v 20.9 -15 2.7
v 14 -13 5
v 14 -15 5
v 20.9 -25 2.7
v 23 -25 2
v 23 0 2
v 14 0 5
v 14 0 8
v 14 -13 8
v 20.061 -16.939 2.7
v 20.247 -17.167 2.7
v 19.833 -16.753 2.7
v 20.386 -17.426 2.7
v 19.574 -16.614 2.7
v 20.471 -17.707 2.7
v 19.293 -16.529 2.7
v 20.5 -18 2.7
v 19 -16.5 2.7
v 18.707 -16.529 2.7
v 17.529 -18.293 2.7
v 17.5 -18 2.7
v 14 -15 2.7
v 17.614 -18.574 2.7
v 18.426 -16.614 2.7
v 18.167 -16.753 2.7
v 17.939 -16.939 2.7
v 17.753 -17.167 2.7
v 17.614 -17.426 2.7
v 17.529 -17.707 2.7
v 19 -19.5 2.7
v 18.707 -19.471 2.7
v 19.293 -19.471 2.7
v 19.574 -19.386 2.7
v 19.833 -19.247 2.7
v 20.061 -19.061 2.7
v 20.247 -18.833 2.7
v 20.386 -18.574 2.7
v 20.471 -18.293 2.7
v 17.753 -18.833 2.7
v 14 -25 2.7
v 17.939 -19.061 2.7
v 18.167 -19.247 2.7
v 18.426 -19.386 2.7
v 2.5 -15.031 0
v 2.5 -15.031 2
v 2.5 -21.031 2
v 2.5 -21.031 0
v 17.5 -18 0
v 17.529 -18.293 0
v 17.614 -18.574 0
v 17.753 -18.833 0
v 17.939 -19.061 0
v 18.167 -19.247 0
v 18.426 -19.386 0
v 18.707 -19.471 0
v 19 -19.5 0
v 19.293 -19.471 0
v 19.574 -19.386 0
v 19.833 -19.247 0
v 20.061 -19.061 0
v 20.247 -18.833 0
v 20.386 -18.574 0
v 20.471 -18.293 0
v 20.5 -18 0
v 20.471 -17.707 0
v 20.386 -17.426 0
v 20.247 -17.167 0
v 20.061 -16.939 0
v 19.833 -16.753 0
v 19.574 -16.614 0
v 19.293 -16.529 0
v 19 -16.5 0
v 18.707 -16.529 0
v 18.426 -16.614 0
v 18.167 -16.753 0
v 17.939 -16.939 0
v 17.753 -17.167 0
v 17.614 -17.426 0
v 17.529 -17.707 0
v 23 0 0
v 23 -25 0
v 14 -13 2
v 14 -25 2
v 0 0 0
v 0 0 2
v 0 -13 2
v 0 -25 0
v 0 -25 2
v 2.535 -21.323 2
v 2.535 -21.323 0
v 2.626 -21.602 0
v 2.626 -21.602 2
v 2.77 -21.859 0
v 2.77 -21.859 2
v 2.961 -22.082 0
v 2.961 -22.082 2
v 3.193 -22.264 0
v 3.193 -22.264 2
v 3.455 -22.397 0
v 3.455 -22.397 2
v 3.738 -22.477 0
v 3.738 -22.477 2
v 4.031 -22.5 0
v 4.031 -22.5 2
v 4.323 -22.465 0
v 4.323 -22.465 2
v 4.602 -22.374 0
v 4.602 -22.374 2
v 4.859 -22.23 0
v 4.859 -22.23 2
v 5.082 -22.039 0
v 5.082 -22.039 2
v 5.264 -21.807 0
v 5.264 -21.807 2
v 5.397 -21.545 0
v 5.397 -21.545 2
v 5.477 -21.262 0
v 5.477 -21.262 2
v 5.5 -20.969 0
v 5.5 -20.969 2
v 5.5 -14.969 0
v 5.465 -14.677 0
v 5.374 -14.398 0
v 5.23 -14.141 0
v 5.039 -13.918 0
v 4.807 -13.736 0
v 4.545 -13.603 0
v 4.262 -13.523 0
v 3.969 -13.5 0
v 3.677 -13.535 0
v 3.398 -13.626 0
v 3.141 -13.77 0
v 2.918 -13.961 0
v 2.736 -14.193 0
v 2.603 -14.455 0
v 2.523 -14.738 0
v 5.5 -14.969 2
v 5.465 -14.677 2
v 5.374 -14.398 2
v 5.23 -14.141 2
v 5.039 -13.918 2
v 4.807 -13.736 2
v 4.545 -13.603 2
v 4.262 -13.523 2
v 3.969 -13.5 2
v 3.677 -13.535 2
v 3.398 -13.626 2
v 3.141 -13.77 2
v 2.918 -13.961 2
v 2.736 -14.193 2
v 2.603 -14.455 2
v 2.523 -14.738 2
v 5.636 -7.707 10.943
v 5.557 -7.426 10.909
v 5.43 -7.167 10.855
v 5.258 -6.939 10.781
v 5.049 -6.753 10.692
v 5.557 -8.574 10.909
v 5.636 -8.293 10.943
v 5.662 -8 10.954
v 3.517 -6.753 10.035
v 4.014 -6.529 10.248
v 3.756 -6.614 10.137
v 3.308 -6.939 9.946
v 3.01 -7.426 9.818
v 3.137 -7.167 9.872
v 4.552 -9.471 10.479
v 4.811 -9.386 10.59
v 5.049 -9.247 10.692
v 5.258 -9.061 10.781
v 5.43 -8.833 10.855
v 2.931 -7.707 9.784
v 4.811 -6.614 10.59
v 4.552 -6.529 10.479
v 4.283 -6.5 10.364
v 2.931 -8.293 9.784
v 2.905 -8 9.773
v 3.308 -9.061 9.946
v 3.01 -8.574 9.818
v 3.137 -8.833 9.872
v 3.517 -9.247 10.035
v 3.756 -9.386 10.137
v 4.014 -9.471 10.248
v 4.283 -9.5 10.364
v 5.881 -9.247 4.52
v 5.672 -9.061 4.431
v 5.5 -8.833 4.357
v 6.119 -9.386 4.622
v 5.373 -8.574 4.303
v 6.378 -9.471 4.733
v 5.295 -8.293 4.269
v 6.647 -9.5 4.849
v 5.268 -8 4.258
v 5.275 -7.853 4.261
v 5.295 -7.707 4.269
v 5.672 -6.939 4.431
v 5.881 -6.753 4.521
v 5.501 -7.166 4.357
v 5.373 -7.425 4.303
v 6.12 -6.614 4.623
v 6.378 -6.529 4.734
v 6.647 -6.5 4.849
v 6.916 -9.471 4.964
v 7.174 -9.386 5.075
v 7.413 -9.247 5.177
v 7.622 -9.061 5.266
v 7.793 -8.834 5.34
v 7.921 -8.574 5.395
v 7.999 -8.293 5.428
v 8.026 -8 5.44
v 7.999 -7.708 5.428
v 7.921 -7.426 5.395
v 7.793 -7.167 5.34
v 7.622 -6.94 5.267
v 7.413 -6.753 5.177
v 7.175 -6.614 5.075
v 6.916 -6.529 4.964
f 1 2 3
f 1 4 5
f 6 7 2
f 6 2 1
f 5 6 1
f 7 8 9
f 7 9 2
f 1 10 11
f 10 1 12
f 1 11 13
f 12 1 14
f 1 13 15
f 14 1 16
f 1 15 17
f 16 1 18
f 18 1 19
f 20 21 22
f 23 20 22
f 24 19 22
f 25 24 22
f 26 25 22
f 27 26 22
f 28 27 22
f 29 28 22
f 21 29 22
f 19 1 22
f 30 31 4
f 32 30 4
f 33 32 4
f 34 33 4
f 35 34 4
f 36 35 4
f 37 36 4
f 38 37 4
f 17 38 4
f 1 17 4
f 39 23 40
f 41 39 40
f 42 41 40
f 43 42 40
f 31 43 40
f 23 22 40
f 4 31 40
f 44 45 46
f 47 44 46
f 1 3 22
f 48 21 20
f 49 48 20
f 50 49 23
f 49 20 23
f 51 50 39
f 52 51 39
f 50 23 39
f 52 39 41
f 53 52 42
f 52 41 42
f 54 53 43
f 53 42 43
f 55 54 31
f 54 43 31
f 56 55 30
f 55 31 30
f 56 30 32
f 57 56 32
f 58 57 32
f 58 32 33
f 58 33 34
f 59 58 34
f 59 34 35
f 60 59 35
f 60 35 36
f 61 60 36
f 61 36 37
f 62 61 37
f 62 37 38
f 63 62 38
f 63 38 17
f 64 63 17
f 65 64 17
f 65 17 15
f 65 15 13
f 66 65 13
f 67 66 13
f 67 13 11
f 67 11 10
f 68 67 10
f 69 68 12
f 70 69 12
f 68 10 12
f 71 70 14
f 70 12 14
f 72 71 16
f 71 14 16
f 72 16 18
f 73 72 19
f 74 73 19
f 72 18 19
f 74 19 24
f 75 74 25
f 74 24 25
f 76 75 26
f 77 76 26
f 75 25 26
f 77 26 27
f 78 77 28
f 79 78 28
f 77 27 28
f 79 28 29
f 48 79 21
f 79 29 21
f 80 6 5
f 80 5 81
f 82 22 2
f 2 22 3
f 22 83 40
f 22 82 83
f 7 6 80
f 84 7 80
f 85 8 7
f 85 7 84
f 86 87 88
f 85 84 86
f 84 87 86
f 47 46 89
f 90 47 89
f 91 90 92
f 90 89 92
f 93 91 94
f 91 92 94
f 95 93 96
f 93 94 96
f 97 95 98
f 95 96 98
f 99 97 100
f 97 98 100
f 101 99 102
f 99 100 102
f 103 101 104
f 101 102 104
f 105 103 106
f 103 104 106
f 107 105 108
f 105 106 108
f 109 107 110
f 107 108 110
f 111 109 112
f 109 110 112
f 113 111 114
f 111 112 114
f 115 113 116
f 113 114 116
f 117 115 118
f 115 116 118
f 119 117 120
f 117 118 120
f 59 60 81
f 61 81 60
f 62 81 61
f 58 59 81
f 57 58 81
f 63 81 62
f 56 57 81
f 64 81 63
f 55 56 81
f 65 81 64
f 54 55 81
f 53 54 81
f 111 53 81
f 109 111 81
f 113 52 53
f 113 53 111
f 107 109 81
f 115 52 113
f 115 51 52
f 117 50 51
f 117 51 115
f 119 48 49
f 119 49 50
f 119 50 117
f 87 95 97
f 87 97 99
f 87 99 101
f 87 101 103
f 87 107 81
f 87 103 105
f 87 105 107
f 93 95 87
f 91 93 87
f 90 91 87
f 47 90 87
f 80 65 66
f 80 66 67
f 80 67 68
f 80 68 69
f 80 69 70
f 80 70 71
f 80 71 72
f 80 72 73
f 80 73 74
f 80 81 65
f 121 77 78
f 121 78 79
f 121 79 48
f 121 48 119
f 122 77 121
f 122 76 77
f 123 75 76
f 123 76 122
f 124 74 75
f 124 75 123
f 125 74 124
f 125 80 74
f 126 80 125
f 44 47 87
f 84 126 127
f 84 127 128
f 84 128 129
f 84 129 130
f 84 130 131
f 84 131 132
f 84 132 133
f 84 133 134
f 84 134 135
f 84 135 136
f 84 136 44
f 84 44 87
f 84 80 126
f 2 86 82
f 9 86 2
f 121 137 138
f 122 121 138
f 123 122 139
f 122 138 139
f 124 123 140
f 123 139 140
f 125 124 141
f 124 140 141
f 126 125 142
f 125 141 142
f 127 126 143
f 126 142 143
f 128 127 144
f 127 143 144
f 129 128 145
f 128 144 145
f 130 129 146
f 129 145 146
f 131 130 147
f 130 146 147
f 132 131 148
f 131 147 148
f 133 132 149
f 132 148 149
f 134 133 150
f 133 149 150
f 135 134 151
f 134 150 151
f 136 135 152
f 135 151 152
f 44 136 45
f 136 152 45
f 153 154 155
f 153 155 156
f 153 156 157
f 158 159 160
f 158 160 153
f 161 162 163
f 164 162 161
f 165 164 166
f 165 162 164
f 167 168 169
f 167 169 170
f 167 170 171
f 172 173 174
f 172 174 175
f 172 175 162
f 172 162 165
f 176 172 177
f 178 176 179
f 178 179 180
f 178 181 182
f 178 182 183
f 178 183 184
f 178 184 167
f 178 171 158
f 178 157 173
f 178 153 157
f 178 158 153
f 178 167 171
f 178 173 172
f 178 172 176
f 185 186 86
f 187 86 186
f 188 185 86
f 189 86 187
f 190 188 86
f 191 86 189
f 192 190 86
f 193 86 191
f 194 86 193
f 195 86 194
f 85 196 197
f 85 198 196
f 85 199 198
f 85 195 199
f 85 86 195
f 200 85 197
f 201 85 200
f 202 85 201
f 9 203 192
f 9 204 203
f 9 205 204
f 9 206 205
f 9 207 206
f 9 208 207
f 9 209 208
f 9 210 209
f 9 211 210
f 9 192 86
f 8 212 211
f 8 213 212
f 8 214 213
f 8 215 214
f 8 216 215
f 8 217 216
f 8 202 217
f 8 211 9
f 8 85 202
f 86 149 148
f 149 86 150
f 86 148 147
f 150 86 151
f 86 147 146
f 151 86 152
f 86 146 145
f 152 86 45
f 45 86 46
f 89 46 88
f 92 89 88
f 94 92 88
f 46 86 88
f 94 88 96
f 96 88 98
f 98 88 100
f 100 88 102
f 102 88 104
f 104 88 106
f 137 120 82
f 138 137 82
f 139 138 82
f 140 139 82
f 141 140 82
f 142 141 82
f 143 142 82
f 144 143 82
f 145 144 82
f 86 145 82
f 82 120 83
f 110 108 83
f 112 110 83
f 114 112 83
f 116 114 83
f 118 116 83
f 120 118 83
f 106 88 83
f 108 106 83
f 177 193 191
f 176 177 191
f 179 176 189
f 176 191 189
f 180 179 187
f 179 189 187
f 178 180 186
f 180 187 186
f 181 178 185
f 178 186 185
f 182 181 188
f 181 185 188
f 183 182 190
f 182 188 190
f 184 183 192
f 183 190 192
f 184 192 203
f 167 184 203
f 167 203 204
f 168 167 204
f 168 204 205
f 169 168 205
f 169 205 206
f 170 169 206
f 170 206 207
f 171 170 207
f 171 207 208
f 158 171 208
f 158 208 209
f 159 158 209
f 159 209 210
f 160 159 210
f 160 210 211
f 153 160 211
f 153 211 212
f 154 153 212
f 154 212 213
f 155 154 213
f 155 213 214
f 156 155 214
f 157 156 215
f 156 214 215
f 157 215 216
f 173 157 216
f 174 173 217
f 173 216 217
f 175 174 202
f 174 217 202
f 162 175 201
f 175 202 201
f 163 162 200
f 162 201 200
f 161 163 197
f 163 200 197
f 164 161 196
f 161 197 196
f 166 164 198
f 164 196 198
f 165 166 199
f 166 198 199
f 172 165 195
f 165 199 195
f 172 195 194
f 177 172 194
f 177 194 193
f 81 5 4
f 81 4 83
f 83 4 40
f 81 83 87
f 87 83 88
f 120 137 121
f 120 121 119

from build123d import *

# Parameters (mm, degrees)
PAD_DEPTH       = 25
POCKET_DEPTH    = 12
SKETCH002_R     = 1.5
PAD001_DEPTH    = 6
POCKET001_DEPTH = 2.001
SKETCH004_W     = 2.3
SKETCH004_H     = 10
POCKET002_DEPTH = 9.001
SKETCH005_R     = 1.5
HOLE_DEPTH      = 2.701


with BuildPart() as part:
    # Sketch → Pad (new body)
    with BuildSketch(Plane.XZ):
        Polygon((0, 0), (0, 2), (14, 8), (14, 5), (23, 2), (23, 0), align=None)
    extrude(amount=PAD_DEPTH)

    # Sketch001 (on Face8 of Pad) → Pocket (cut)
    with BuildSketch(Plane.XZ.offset(25)):
        Polygon((0, 2), (14, 2), (14, 8), align=None)
    extrude(amount=-POCKET_DEPTH, mode=Mode.SUBTRACT)

    # Sketch002 (on Face3 of Pocket) → Pad001 (join)
    with BuildSketch(Plane(origin=(-0.724138, 0, 1.689655), x_dir=(-0.919145, 0, -0.393919), z_dir=(-0.393919, 0, 0.919145))):
        with Locations((-8.019385, 8)):
            Circle(SKETCH002_R)
    extrude(amount=PAD001_DEPTH)

    # Sketch003 (on Face4 of Pad001) → Pocket001 (cut, through all)
    with BuildSketch(Plane(origin=(0, 0, 2), x_dir=(-1, 0, 0), z_dir=(0, 0, 1))):
        with BuildLine():
            ThreePointArc((-2.500319, 21.030919), (-4.030919, 22.499681), (-5.499681, 20.969081))
            Line((-5.499681, 14.969081), (-5.499681, 20.969081))
            ThreePointArc((-5.499681, 14.969081), (-3.969081, 13.500319), (-2.500319, 15.030919))
            Line((-2.500319, 15.030919), (-2.500319, 21.030919))
        make_face()
    extrude(amount=-POCKET001_DEPTH, mode=Mode.SUBTRACT)

    # Sketch004 (on Face15 of Pocket001) → Pocket002 (cut, through all)
    with BuildSketch(Plane(origin=(14, 0, 0), x_dir=(0, 0, -1), z_dir=(-1, 0, 0))):
        with Locations((-3.85, 20)):
            Rectangle(SKETCH004_W, SKETCH004_H)
    extrude(amount=-POCKET002_DEPTH, mode=Mode.SUBTRACT)

    # Sketch005 (on Face17 of Pocket002) → Hole (cut, through all)
    with BuildSketch(Plane(origin=(0, 0, 2.7), x_dir=(-1, 0, 0), z_dir=(0, 0, 1))):
        with Locations((-19, 18)):
            Circle(SKETCH005_R)
    extrude(amount=-HOLE_DEPTH, mode=Mode.SUBTRACT)


solid = part.part
